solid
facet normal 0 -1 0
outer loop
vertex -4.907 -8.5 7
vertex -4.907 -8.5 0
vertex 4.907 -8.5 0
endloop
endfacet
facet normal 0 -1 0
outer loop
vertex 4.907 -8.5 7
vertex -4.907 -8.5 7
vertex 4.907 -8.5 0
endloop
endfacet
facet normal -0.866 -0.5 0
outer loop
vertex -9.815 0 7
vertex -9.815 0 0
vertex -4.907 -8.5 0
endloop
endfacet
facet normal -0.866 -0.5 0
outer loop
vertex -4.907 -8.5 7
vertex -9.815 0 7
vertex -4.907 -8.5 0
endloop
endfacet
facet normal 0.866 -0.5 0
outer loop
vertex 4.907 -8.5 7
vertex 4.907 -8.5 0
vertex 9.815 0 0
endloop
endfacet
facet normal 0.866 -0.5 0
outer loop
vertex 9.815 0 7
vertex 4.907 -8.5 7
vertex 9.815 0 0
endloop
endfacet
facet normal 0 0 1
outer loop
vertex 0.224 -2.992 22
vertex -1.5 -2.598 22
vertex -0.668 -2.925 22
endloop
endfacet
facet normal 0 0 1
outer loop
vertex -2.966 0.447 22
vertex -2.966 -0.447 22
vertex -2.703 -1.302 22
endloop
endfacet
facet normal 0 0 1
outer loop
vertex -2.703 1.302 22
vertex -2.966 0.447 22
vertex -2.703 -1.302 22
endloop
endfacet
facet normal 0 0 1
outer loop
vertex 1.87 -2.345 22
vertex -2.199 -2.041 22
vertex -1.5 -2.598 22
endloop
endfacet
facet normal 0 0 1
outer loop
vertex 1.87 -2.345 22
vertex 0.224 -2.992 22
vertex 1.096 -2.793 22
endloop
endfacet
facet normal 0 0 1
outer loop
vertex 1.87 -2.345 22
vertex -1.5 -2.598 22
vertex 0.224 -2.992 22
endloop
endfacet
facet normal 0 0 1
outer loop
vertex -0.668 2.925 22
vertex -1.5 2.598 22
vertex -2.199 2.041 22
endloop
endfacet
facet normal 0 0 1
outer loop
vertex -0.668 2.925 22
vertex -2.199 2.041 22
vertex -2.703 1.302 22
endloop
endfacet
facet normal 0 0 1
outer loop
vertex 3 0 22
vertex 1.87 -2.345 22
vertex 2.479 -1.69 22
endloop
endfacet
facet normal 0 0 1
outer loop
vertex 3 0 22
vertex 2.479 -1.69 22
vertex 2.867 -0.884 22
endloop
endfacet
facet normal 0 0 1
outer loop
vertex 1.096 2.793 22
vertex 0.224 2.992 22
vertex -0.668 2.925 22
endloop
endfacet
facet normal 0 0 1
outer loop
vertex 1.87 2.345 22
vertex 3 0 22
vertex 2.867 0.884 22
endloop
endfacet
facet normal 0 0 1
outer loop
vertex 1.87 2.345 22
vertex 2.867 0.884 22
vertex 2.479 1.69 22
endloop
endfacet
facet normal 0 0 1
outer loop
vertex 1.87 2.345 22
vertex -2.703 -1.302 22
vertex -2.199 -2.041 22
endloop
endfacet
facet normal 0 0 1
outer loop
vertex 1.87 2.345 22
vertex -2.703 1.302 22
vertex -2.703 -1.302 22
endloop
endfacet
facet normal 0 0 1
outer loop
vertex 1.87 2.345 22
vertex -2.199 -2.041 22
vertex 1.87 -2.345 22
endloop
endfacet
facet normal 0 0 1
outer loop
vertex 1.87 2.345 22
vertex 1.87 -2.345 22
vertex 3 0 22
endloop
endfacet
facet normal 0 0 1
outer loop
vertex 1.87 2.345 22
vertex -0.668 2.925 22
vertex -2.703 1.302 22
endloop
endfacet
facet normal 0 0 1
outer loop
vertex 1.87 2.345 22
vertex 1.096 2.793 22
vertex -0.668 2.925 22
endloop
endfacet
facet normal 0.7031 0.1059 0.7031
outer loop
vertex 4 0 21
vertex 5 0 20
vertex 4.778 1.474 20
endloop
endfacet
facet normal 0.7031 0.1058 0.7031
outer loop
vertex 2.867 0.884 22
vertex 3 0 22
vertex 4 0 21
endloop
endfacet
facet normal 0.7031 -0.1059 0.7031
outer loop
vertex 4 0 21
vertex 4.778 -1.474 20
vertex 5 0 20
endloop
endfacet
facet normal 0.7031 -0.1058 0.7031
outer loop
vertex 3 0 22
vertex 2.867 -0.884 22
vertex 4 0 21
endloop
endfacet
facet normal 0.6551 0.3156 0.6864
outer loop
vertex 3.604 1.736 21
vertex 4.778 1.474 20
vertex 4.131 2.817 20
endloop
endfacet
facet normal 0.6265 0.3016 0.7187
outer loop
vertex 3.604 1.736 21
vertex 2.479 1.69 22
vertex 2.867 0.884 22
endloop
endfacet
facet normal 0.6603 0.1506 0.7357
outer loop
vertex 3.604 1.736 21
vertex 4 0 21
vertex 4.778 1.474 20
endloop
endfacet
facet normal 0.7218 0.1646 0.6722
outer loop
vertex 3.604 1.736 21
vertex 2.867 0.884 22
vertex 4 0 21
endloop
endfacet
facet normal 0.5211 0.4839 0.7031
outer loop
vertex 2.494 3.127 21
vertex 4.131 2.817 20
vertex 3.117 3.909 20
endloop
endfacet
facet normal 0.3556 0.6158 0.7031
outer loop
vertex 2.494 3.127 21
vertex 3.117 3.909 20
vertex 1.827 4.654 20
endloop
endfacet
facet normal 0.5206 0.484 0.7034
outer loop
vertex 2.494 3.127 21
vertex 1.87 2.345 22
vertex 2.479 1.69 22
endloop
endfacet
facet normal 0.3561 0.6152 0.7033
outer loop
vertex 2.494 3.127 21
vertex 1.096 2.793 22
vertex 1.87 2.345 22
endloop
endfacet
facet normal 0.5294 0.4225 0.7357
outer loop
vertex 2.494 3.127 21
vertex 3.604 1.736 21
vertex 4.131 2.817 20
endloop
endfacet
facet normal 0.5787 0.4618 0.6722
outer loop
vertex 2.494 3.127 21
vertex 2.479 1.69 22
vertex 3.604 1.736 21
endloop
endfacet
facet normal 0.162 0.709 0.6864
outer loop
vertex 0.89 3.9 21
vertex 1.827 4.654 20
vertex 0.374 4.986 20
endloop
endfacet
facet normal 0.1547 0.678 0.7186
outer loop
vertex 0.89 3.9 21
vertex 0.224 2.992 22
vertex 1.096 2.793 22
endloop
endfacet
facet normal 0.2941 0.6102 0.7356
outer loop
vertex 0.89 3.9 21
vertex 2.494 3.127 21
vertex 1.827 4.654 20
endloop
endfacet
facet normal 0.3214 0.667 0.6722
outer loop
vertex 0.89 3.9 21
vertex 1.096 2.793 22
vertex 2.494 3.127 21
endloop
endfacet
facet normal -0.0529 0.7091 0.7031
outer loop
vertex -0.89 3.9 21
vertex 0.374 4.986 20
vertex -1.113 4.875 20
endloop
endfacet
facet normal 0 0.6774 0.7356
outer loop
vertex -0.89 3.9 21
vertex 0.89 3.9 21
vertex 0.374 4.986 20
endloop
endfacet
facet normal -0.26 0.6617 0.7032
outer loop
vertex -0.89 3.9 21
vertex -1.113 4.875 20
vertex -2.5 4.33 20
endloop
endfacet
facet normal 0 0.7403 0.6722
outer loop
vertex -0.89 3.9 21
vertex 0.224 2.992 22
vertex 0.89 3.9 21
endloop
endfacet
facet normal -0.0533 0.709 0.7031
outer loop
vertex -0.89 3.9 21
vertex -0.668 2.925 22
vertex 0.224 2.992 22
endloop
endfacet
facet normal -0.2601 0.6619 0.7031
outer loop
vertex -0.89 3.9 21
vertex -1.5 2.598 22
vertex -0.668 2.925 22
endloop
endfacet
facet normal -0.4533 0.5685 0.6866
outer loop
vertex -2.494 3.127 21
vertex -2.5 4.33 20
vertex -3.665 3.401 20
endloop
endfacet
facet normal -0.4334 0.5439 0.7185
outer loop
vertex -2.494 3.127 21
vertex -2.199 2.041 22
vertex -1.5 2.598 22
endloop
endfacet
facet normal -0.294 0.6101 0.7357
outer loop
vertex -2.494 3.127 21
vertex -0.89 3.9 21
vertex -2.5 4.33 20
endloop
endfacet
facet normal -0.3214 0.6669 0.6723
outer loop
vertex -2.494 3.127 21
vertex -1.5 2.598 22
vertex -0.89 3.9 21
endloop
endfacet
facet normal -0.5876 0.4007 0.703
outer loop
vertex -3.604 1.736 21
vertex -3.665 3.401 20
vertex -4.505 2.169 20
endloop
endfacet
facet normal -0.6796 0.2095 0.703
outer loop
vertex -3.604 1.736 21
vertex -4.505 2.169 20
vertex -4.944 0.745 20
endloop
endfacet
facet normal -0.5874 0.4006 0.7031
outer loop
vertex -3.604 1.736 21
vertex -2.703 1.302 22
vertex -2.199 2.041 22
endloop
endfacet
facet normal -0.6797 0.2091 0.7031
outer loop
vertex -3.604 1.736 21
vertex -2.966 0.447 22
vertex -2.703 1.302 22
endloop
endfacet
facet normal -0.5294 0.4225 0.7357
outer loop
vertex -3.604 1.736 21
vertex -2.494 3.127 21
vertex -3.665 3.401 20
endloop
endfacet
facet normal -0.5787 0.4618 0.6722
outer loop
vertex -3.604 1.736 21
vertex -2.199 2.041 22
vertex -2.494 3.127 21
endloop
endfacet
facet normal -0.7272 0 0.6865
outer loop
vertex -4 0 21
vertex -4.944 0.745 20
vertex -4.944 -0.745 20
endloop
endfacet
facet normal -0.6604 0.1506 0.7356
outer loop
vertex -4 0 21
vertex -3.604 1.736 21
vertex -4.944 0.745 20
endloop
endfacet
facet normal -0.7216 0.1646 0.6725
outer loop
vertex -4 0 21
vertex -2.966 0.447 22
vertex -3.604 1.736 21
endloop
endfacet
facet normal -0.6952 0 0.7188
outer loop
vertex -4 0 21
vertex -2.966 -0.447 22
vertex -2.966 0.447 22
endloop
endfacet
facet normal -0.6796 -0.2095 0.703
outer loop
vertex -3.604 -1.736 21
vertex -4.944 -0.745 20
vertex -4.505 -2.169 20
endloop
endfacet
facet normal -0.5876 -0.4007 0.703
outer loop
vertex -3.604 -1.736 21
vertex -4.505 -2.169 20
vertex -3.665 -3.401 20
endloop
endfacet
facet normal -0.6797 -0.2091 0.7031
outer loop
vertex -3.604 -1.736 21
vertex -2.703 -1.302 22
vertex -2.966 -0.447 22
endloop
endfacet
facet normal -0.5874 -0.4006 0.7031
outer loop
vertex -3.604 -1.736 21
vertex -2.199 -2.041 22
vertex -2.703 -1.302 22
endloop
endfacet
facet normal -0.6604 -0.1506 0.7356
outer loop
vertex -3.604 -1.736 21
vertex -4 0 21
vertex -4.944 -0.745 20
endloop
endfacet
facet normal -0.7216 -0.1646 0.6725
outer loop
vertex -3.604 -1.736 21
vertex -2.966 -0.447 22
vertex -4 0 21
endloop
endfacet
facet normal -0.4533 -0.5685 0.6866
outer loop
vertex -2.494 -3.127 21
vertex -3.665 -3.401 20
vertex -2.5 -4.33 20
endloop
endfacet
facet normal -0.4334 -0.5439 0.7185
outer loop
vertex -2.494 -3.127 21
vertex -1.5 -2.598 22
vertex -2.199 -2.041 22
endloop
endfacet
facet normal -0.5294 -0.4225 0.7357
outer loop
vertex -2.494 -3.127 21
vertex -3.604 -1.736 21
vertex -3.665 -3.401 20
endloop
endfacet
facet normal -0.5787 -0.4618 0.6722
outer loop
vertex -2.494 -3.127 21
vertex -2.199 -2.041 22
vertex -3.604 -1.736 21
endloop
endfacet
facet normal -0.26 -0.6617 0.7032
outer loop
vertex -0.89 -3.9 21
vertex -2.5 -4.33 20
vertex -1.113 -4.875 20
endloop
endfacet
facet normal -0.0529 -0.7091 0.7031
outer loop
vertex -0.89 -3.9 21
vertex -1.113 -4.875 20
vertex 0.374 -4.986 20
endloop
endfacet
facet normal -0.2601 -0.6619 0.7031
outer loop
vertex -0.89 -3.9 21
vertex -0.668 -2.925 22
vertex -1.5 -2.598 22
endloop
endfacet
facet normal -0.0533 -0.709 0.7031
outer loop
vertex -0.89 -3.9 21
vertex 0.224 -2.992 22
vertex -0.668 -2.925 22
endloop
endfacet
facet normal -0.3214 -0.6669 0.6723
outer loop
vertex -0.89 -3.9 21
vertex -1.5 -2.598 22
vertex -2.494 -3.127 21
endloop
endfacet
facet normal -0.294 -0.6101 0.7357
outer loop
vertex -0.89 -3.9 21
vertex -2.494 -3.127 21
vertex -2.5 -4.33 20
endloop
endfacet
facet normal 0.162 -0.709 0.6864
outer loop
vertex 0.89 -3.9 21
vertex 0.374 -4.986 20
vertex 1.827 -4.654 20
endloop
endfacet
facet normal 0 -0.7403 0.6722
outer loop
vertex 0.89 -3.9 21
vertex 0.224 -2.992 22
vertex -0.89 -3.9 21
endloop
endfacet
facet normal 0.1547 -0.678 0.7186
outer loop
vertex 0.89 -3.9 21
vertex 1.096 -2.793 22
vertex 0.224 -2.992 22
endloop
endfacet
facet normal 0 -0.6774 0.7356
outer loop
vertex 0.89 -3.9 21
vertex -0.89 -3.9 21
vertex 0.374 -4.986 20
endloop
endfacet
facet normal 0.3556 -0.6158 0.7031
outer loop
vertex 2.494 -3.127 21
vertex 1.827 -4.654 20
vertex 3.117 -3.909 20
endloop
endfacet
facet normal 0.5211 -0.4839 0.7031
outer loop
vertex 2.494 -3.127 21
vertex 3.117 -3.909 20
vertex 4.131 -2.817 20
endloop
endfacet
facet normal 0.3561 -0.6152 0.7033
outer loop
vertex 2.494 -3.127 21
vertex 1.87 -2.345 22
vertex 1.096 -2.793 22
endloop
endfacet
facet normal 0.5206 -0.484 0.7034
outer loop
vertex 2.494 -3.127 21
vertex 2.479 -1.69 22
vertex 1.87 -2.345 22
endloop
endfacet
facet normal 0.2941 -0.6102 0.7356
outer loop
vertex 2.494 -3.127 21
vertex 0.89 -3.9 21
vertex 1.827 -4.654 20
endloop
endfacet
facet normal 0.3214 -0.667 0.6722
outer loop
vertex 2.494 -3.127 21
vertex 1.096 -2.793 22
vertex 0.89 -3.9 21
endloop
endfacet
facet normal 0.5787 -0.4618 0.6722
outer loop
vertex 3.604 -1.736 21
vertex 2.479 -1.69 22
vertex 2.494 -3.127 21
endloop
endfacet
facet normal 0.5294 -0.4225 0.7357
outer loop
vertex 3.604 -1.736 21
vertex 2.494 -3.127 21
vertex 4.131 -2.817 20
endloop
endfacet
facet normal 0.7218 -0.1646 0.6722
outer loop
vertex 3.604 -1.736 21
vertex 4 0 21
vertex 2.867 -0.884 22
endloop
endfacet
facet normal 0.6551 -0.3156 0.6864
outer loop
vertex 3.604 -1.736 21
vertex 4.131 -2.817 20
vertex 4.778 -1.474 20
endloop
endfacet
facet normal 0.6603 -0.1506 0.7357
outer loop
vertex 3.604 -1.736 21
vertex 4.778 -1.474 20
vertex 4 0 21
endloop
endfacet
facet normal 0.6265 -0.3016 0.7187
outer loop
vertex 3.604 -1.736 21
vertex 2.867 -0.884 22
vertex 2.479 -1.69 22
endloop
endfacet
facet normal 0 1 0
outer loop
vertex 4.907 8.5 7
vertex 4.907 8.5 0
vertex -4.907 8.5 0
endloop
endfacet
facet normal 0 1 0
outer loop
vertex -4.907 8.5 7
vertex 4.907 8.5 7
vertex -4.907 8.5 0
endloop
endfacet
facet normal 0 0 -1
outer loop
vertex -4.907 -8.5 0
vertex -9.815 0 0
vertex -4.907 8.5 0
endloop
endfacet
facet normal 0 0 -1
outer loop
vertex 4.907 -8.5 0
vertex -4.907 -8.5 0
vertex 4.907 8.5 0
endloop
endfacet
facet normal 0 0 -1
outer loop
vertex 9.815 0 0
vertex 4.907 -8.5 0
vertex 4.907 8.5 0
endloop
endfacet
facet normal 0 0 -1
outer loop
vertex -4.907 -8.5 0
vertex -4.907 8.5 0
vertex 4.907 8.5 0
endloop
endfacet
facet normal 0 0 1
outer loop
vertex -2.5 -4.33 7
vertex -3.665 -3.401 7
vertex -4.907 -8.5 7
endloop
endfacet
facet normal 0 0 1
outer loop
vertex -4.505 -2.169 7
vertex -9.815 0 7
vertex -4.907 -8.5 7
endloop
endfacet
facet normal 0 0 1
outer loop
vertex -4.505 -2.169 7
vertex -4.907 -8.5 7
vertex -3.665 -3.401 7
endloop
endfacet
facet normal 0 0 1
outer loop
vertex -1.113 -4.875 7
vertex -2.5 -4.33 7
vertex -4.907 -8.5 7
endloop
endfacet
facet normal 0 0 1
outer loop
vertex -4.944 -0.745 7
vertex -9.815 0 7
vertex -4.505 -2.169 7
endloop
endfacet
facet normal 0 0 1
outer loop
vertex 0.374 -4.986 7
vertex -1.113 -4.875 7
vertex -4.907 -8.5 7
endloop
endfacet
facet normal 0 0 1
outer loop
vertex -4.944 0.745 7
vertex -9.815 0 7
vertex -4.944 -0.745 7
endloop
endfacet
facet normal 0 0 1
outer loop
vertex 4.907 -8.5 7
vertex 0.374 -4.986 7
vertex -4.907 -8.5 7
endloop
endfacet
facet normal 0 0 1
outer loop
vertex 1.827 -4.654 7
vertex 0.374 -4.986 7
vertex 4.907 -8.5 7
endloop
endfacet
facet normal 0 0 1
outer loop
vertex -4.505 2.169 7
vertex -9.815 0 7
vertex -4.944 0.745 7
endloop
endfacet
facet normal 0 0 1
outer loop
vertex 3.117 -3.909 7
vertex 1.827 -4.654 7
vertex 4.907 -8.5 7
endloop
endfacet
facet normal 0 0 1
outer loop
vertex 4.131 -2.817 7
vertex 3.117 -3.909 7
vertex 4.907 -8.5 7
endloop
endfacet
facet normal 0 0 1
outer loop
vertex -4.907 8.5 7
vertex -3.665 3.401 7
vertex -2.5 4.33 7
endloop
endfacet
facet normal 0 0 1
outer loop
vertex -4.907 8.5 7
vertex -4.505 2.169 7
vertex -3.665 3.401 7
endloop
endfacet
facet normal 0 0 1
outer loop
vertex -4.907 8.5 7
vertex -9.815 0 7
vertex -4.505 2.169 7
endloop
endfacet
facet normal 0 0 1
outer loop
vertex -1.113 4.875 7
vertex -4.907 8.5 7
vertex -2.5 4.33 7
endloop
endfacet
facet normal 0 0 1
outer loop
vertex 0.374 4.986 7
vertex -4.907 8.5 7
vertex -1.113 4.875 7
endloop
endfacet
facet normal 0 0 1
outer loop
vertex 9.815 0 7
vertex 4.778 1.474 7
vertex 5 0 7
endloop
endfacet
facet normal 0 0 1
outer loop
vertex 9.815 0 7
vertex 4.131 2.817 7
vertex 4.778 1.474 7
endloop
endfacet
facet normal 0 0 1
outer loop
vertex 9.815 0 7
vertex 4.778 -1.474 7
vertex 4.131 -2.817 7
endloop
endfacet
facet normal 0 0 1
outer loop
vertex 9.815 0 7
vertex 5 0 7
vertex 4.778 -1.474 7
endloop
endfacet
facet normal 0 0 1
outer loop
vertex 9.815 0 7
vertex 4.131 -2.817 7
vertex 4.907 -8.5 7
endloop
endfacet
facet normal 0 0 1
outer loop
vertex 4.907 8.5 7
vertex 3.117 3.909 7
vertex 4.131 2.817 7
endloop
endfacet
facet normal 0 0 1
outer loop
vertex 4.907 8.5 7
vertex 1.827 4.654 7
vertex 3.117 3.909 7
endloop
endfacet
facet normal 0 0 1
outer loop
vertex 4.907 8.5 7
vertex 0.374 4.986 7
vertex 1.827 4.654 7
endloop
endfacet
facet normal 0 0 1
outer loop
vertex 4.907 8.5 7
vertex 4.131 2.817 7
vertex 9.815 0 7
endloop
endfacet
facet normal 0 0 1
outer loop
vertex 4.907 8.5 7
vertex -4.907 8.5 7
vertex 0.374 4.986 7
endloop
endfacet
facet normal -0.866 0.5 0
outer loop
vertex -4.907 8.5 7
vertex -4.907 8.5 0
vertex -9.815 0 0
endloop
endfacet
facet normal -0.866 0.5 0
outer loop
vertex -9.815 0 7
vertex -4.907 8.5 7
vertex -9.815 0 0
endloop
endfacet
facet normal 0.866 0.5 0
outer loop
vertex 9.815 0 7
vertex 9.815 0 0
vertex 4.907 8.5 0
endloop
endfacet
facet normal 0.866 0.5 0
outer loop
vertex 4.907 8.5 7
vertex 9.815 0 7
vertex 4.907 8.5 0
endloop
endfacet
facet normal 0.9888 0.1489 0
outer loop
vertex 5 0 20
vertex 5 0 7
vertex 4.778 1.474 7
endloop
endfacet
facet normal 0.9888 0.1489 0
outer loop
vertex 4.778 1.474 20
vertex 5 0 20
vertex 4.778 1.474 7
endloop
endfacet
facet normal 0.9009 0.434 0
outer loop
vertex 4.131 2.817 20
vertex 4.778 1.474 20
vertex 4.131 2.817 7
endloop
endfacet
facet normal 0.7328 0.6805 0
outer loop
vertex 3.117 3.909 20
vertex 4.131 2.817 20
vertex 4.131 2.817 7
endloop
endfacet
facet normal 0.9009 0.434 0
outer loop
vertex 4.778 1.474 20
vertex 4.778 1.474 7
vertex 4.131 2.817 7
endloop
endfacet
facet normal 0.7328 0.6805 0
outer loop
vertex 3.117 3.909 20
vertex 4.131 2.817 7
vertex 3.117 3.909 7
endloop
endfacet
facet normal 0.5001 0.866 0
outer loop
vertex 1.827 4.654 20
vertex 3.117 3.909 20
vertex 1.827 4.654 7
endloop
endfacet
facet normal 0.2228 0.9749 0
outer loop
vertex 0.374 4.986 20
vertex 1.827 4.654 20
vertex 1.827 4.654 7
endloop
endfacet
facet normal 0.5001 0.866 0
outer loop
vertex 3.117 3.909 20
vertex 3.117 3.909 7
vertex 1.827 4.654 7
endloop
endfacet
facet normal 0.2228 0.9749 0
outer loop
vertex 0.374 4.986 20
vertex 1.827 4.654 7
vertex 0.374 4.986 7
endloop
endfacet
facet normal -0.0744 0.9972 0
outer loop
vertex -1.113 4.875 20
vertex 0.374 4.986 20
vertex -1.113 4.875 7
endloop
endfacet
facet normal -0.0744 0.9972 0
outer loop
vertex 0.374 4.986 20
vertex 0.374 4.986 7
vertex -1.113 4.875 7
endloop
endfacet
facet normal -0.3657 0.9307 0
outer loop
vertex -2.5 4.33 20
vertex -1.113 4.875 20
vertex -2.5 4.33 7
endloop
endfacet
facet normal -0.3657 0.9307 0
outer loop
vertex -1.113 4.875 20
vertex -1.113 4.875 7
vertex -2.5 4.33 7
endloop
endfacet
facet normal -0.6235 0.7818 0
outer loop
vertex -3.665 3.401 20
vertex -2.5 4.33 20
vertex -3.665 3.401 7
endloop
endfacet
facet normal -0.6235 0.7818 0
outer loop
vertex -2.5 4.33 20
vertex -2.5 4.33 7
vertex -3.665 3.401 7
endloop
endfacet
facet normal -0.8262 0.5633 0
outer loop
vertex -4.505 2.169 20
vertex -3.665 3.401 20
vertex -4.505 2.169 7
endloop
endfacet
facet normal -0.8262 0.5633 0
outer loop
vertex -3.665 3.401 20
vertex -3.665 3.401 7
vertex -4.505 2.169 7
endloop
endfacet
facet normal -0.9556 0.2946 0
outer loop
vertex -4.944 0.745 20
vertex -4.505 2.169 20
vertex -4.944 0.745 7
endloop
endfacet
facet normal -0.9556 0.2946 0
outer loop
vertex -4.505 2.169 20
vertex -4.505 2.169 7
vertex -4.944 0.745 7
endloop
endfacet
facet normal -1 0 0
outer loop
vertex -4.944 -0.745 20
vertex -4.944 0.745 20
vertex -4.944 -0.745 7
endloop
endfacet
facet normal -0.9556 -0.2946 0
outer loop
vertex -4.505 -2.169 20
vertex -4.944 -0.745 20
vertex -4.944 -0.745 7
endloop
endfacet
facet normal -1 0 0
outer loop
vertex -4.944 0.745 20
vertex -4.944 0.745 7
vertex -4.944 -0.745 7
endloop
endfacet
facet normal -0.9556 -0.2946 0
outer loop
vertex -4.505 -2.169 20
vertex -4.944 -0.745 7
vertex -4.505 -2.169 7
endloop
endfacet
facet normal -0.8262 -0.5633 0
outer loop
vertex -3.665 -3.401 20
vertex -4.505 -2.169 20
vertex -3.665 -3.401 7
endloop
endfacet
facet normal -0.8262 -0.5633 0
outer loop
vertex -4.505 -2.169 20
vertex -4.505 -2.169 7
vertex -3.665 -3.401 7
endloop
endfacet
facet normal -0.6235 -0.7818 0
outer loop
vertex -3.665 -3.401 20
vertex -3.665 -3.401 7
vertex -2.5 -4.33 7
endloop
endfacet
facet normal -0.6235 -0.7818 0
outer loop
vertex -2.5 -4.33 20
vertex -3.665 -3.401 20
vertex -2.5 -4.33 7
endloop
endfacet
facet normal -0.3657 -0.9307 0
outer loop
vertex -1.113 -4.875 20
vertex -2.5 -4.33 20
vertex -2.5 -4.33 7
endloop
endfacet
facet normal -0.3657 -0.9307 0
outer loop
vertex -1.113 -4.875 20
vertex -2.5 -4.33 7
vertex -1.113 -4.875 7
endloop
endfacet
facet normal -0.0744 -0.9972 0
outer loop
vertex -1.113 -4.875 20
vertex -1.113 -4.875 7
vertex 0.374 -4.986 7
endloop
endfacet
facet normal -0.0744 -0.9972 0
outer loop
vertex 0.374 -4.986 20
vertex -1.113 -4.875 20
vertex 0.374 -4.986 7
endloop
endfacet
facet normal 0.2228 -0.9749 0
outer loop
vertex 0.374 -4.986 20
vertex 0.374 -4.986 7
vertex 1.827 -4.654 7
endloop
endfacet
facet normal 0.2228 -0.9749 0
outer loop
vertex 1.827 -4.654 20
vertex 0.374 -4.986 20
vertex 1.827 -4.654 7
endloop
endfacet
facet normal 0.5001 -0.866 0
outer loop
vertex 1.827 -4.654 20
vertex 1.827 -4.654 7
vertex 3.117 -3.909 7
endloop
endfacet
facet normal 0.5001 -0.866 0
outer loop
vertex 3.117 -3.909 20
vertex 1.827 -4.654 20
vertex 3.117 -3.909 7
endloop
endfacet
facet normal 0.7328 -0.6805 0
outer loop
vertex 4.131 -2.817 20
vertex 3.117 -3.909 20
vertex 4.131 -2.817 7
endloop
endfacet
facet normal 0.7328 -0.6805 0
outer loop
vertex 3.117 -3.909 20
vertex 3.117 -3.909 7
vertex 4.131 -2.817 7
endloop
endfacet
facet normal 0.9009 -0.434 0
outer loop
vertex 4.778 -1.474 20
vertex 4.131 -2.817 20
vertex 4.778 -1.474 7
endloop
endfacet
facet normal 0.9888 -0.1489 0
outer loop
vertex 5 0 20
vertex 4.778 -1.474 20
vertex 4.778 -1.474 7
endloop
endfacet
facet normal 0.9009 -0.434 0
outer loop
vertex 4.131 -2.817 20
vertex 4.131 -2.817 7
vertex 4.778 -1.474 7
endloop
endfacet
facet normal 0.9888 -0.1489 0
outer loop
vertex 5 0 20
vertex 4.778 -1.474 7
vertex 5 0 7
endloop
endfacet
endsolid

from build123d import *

# Parameters (mm, degrees)
F1_DEPTH = 7
F2_R     = 5
F3_DEPTH = 15
F4_SIZE  = 2


with BuildPart() as f1:
    # F0 (on Top) → F1 (new body)
    with BuildSketch(Plane.XY):
        Polygon((-4.907477, -8.5), (4.907477, -8.5), (9.814955, 0), (4.907477, 8.5), (-4.907477, 8.5), (-9.814955, 0), align=None)
    extrude(amount=F1_DEPTH)

    # F2 (on face) → F3 (join)
    with BuildSketch(Plane.XY.offset(7)):
        Circle(F2_R)
    extrude(amount=F3_DEPTH)

    # F4
    f4_edges = [f1.edges().sort_by_distance(p)[0] for p in [
        (-5, 0, 22),
    ]]
    chamfer(f4_edges, length=F4_SIZE)


solid = f1.part
